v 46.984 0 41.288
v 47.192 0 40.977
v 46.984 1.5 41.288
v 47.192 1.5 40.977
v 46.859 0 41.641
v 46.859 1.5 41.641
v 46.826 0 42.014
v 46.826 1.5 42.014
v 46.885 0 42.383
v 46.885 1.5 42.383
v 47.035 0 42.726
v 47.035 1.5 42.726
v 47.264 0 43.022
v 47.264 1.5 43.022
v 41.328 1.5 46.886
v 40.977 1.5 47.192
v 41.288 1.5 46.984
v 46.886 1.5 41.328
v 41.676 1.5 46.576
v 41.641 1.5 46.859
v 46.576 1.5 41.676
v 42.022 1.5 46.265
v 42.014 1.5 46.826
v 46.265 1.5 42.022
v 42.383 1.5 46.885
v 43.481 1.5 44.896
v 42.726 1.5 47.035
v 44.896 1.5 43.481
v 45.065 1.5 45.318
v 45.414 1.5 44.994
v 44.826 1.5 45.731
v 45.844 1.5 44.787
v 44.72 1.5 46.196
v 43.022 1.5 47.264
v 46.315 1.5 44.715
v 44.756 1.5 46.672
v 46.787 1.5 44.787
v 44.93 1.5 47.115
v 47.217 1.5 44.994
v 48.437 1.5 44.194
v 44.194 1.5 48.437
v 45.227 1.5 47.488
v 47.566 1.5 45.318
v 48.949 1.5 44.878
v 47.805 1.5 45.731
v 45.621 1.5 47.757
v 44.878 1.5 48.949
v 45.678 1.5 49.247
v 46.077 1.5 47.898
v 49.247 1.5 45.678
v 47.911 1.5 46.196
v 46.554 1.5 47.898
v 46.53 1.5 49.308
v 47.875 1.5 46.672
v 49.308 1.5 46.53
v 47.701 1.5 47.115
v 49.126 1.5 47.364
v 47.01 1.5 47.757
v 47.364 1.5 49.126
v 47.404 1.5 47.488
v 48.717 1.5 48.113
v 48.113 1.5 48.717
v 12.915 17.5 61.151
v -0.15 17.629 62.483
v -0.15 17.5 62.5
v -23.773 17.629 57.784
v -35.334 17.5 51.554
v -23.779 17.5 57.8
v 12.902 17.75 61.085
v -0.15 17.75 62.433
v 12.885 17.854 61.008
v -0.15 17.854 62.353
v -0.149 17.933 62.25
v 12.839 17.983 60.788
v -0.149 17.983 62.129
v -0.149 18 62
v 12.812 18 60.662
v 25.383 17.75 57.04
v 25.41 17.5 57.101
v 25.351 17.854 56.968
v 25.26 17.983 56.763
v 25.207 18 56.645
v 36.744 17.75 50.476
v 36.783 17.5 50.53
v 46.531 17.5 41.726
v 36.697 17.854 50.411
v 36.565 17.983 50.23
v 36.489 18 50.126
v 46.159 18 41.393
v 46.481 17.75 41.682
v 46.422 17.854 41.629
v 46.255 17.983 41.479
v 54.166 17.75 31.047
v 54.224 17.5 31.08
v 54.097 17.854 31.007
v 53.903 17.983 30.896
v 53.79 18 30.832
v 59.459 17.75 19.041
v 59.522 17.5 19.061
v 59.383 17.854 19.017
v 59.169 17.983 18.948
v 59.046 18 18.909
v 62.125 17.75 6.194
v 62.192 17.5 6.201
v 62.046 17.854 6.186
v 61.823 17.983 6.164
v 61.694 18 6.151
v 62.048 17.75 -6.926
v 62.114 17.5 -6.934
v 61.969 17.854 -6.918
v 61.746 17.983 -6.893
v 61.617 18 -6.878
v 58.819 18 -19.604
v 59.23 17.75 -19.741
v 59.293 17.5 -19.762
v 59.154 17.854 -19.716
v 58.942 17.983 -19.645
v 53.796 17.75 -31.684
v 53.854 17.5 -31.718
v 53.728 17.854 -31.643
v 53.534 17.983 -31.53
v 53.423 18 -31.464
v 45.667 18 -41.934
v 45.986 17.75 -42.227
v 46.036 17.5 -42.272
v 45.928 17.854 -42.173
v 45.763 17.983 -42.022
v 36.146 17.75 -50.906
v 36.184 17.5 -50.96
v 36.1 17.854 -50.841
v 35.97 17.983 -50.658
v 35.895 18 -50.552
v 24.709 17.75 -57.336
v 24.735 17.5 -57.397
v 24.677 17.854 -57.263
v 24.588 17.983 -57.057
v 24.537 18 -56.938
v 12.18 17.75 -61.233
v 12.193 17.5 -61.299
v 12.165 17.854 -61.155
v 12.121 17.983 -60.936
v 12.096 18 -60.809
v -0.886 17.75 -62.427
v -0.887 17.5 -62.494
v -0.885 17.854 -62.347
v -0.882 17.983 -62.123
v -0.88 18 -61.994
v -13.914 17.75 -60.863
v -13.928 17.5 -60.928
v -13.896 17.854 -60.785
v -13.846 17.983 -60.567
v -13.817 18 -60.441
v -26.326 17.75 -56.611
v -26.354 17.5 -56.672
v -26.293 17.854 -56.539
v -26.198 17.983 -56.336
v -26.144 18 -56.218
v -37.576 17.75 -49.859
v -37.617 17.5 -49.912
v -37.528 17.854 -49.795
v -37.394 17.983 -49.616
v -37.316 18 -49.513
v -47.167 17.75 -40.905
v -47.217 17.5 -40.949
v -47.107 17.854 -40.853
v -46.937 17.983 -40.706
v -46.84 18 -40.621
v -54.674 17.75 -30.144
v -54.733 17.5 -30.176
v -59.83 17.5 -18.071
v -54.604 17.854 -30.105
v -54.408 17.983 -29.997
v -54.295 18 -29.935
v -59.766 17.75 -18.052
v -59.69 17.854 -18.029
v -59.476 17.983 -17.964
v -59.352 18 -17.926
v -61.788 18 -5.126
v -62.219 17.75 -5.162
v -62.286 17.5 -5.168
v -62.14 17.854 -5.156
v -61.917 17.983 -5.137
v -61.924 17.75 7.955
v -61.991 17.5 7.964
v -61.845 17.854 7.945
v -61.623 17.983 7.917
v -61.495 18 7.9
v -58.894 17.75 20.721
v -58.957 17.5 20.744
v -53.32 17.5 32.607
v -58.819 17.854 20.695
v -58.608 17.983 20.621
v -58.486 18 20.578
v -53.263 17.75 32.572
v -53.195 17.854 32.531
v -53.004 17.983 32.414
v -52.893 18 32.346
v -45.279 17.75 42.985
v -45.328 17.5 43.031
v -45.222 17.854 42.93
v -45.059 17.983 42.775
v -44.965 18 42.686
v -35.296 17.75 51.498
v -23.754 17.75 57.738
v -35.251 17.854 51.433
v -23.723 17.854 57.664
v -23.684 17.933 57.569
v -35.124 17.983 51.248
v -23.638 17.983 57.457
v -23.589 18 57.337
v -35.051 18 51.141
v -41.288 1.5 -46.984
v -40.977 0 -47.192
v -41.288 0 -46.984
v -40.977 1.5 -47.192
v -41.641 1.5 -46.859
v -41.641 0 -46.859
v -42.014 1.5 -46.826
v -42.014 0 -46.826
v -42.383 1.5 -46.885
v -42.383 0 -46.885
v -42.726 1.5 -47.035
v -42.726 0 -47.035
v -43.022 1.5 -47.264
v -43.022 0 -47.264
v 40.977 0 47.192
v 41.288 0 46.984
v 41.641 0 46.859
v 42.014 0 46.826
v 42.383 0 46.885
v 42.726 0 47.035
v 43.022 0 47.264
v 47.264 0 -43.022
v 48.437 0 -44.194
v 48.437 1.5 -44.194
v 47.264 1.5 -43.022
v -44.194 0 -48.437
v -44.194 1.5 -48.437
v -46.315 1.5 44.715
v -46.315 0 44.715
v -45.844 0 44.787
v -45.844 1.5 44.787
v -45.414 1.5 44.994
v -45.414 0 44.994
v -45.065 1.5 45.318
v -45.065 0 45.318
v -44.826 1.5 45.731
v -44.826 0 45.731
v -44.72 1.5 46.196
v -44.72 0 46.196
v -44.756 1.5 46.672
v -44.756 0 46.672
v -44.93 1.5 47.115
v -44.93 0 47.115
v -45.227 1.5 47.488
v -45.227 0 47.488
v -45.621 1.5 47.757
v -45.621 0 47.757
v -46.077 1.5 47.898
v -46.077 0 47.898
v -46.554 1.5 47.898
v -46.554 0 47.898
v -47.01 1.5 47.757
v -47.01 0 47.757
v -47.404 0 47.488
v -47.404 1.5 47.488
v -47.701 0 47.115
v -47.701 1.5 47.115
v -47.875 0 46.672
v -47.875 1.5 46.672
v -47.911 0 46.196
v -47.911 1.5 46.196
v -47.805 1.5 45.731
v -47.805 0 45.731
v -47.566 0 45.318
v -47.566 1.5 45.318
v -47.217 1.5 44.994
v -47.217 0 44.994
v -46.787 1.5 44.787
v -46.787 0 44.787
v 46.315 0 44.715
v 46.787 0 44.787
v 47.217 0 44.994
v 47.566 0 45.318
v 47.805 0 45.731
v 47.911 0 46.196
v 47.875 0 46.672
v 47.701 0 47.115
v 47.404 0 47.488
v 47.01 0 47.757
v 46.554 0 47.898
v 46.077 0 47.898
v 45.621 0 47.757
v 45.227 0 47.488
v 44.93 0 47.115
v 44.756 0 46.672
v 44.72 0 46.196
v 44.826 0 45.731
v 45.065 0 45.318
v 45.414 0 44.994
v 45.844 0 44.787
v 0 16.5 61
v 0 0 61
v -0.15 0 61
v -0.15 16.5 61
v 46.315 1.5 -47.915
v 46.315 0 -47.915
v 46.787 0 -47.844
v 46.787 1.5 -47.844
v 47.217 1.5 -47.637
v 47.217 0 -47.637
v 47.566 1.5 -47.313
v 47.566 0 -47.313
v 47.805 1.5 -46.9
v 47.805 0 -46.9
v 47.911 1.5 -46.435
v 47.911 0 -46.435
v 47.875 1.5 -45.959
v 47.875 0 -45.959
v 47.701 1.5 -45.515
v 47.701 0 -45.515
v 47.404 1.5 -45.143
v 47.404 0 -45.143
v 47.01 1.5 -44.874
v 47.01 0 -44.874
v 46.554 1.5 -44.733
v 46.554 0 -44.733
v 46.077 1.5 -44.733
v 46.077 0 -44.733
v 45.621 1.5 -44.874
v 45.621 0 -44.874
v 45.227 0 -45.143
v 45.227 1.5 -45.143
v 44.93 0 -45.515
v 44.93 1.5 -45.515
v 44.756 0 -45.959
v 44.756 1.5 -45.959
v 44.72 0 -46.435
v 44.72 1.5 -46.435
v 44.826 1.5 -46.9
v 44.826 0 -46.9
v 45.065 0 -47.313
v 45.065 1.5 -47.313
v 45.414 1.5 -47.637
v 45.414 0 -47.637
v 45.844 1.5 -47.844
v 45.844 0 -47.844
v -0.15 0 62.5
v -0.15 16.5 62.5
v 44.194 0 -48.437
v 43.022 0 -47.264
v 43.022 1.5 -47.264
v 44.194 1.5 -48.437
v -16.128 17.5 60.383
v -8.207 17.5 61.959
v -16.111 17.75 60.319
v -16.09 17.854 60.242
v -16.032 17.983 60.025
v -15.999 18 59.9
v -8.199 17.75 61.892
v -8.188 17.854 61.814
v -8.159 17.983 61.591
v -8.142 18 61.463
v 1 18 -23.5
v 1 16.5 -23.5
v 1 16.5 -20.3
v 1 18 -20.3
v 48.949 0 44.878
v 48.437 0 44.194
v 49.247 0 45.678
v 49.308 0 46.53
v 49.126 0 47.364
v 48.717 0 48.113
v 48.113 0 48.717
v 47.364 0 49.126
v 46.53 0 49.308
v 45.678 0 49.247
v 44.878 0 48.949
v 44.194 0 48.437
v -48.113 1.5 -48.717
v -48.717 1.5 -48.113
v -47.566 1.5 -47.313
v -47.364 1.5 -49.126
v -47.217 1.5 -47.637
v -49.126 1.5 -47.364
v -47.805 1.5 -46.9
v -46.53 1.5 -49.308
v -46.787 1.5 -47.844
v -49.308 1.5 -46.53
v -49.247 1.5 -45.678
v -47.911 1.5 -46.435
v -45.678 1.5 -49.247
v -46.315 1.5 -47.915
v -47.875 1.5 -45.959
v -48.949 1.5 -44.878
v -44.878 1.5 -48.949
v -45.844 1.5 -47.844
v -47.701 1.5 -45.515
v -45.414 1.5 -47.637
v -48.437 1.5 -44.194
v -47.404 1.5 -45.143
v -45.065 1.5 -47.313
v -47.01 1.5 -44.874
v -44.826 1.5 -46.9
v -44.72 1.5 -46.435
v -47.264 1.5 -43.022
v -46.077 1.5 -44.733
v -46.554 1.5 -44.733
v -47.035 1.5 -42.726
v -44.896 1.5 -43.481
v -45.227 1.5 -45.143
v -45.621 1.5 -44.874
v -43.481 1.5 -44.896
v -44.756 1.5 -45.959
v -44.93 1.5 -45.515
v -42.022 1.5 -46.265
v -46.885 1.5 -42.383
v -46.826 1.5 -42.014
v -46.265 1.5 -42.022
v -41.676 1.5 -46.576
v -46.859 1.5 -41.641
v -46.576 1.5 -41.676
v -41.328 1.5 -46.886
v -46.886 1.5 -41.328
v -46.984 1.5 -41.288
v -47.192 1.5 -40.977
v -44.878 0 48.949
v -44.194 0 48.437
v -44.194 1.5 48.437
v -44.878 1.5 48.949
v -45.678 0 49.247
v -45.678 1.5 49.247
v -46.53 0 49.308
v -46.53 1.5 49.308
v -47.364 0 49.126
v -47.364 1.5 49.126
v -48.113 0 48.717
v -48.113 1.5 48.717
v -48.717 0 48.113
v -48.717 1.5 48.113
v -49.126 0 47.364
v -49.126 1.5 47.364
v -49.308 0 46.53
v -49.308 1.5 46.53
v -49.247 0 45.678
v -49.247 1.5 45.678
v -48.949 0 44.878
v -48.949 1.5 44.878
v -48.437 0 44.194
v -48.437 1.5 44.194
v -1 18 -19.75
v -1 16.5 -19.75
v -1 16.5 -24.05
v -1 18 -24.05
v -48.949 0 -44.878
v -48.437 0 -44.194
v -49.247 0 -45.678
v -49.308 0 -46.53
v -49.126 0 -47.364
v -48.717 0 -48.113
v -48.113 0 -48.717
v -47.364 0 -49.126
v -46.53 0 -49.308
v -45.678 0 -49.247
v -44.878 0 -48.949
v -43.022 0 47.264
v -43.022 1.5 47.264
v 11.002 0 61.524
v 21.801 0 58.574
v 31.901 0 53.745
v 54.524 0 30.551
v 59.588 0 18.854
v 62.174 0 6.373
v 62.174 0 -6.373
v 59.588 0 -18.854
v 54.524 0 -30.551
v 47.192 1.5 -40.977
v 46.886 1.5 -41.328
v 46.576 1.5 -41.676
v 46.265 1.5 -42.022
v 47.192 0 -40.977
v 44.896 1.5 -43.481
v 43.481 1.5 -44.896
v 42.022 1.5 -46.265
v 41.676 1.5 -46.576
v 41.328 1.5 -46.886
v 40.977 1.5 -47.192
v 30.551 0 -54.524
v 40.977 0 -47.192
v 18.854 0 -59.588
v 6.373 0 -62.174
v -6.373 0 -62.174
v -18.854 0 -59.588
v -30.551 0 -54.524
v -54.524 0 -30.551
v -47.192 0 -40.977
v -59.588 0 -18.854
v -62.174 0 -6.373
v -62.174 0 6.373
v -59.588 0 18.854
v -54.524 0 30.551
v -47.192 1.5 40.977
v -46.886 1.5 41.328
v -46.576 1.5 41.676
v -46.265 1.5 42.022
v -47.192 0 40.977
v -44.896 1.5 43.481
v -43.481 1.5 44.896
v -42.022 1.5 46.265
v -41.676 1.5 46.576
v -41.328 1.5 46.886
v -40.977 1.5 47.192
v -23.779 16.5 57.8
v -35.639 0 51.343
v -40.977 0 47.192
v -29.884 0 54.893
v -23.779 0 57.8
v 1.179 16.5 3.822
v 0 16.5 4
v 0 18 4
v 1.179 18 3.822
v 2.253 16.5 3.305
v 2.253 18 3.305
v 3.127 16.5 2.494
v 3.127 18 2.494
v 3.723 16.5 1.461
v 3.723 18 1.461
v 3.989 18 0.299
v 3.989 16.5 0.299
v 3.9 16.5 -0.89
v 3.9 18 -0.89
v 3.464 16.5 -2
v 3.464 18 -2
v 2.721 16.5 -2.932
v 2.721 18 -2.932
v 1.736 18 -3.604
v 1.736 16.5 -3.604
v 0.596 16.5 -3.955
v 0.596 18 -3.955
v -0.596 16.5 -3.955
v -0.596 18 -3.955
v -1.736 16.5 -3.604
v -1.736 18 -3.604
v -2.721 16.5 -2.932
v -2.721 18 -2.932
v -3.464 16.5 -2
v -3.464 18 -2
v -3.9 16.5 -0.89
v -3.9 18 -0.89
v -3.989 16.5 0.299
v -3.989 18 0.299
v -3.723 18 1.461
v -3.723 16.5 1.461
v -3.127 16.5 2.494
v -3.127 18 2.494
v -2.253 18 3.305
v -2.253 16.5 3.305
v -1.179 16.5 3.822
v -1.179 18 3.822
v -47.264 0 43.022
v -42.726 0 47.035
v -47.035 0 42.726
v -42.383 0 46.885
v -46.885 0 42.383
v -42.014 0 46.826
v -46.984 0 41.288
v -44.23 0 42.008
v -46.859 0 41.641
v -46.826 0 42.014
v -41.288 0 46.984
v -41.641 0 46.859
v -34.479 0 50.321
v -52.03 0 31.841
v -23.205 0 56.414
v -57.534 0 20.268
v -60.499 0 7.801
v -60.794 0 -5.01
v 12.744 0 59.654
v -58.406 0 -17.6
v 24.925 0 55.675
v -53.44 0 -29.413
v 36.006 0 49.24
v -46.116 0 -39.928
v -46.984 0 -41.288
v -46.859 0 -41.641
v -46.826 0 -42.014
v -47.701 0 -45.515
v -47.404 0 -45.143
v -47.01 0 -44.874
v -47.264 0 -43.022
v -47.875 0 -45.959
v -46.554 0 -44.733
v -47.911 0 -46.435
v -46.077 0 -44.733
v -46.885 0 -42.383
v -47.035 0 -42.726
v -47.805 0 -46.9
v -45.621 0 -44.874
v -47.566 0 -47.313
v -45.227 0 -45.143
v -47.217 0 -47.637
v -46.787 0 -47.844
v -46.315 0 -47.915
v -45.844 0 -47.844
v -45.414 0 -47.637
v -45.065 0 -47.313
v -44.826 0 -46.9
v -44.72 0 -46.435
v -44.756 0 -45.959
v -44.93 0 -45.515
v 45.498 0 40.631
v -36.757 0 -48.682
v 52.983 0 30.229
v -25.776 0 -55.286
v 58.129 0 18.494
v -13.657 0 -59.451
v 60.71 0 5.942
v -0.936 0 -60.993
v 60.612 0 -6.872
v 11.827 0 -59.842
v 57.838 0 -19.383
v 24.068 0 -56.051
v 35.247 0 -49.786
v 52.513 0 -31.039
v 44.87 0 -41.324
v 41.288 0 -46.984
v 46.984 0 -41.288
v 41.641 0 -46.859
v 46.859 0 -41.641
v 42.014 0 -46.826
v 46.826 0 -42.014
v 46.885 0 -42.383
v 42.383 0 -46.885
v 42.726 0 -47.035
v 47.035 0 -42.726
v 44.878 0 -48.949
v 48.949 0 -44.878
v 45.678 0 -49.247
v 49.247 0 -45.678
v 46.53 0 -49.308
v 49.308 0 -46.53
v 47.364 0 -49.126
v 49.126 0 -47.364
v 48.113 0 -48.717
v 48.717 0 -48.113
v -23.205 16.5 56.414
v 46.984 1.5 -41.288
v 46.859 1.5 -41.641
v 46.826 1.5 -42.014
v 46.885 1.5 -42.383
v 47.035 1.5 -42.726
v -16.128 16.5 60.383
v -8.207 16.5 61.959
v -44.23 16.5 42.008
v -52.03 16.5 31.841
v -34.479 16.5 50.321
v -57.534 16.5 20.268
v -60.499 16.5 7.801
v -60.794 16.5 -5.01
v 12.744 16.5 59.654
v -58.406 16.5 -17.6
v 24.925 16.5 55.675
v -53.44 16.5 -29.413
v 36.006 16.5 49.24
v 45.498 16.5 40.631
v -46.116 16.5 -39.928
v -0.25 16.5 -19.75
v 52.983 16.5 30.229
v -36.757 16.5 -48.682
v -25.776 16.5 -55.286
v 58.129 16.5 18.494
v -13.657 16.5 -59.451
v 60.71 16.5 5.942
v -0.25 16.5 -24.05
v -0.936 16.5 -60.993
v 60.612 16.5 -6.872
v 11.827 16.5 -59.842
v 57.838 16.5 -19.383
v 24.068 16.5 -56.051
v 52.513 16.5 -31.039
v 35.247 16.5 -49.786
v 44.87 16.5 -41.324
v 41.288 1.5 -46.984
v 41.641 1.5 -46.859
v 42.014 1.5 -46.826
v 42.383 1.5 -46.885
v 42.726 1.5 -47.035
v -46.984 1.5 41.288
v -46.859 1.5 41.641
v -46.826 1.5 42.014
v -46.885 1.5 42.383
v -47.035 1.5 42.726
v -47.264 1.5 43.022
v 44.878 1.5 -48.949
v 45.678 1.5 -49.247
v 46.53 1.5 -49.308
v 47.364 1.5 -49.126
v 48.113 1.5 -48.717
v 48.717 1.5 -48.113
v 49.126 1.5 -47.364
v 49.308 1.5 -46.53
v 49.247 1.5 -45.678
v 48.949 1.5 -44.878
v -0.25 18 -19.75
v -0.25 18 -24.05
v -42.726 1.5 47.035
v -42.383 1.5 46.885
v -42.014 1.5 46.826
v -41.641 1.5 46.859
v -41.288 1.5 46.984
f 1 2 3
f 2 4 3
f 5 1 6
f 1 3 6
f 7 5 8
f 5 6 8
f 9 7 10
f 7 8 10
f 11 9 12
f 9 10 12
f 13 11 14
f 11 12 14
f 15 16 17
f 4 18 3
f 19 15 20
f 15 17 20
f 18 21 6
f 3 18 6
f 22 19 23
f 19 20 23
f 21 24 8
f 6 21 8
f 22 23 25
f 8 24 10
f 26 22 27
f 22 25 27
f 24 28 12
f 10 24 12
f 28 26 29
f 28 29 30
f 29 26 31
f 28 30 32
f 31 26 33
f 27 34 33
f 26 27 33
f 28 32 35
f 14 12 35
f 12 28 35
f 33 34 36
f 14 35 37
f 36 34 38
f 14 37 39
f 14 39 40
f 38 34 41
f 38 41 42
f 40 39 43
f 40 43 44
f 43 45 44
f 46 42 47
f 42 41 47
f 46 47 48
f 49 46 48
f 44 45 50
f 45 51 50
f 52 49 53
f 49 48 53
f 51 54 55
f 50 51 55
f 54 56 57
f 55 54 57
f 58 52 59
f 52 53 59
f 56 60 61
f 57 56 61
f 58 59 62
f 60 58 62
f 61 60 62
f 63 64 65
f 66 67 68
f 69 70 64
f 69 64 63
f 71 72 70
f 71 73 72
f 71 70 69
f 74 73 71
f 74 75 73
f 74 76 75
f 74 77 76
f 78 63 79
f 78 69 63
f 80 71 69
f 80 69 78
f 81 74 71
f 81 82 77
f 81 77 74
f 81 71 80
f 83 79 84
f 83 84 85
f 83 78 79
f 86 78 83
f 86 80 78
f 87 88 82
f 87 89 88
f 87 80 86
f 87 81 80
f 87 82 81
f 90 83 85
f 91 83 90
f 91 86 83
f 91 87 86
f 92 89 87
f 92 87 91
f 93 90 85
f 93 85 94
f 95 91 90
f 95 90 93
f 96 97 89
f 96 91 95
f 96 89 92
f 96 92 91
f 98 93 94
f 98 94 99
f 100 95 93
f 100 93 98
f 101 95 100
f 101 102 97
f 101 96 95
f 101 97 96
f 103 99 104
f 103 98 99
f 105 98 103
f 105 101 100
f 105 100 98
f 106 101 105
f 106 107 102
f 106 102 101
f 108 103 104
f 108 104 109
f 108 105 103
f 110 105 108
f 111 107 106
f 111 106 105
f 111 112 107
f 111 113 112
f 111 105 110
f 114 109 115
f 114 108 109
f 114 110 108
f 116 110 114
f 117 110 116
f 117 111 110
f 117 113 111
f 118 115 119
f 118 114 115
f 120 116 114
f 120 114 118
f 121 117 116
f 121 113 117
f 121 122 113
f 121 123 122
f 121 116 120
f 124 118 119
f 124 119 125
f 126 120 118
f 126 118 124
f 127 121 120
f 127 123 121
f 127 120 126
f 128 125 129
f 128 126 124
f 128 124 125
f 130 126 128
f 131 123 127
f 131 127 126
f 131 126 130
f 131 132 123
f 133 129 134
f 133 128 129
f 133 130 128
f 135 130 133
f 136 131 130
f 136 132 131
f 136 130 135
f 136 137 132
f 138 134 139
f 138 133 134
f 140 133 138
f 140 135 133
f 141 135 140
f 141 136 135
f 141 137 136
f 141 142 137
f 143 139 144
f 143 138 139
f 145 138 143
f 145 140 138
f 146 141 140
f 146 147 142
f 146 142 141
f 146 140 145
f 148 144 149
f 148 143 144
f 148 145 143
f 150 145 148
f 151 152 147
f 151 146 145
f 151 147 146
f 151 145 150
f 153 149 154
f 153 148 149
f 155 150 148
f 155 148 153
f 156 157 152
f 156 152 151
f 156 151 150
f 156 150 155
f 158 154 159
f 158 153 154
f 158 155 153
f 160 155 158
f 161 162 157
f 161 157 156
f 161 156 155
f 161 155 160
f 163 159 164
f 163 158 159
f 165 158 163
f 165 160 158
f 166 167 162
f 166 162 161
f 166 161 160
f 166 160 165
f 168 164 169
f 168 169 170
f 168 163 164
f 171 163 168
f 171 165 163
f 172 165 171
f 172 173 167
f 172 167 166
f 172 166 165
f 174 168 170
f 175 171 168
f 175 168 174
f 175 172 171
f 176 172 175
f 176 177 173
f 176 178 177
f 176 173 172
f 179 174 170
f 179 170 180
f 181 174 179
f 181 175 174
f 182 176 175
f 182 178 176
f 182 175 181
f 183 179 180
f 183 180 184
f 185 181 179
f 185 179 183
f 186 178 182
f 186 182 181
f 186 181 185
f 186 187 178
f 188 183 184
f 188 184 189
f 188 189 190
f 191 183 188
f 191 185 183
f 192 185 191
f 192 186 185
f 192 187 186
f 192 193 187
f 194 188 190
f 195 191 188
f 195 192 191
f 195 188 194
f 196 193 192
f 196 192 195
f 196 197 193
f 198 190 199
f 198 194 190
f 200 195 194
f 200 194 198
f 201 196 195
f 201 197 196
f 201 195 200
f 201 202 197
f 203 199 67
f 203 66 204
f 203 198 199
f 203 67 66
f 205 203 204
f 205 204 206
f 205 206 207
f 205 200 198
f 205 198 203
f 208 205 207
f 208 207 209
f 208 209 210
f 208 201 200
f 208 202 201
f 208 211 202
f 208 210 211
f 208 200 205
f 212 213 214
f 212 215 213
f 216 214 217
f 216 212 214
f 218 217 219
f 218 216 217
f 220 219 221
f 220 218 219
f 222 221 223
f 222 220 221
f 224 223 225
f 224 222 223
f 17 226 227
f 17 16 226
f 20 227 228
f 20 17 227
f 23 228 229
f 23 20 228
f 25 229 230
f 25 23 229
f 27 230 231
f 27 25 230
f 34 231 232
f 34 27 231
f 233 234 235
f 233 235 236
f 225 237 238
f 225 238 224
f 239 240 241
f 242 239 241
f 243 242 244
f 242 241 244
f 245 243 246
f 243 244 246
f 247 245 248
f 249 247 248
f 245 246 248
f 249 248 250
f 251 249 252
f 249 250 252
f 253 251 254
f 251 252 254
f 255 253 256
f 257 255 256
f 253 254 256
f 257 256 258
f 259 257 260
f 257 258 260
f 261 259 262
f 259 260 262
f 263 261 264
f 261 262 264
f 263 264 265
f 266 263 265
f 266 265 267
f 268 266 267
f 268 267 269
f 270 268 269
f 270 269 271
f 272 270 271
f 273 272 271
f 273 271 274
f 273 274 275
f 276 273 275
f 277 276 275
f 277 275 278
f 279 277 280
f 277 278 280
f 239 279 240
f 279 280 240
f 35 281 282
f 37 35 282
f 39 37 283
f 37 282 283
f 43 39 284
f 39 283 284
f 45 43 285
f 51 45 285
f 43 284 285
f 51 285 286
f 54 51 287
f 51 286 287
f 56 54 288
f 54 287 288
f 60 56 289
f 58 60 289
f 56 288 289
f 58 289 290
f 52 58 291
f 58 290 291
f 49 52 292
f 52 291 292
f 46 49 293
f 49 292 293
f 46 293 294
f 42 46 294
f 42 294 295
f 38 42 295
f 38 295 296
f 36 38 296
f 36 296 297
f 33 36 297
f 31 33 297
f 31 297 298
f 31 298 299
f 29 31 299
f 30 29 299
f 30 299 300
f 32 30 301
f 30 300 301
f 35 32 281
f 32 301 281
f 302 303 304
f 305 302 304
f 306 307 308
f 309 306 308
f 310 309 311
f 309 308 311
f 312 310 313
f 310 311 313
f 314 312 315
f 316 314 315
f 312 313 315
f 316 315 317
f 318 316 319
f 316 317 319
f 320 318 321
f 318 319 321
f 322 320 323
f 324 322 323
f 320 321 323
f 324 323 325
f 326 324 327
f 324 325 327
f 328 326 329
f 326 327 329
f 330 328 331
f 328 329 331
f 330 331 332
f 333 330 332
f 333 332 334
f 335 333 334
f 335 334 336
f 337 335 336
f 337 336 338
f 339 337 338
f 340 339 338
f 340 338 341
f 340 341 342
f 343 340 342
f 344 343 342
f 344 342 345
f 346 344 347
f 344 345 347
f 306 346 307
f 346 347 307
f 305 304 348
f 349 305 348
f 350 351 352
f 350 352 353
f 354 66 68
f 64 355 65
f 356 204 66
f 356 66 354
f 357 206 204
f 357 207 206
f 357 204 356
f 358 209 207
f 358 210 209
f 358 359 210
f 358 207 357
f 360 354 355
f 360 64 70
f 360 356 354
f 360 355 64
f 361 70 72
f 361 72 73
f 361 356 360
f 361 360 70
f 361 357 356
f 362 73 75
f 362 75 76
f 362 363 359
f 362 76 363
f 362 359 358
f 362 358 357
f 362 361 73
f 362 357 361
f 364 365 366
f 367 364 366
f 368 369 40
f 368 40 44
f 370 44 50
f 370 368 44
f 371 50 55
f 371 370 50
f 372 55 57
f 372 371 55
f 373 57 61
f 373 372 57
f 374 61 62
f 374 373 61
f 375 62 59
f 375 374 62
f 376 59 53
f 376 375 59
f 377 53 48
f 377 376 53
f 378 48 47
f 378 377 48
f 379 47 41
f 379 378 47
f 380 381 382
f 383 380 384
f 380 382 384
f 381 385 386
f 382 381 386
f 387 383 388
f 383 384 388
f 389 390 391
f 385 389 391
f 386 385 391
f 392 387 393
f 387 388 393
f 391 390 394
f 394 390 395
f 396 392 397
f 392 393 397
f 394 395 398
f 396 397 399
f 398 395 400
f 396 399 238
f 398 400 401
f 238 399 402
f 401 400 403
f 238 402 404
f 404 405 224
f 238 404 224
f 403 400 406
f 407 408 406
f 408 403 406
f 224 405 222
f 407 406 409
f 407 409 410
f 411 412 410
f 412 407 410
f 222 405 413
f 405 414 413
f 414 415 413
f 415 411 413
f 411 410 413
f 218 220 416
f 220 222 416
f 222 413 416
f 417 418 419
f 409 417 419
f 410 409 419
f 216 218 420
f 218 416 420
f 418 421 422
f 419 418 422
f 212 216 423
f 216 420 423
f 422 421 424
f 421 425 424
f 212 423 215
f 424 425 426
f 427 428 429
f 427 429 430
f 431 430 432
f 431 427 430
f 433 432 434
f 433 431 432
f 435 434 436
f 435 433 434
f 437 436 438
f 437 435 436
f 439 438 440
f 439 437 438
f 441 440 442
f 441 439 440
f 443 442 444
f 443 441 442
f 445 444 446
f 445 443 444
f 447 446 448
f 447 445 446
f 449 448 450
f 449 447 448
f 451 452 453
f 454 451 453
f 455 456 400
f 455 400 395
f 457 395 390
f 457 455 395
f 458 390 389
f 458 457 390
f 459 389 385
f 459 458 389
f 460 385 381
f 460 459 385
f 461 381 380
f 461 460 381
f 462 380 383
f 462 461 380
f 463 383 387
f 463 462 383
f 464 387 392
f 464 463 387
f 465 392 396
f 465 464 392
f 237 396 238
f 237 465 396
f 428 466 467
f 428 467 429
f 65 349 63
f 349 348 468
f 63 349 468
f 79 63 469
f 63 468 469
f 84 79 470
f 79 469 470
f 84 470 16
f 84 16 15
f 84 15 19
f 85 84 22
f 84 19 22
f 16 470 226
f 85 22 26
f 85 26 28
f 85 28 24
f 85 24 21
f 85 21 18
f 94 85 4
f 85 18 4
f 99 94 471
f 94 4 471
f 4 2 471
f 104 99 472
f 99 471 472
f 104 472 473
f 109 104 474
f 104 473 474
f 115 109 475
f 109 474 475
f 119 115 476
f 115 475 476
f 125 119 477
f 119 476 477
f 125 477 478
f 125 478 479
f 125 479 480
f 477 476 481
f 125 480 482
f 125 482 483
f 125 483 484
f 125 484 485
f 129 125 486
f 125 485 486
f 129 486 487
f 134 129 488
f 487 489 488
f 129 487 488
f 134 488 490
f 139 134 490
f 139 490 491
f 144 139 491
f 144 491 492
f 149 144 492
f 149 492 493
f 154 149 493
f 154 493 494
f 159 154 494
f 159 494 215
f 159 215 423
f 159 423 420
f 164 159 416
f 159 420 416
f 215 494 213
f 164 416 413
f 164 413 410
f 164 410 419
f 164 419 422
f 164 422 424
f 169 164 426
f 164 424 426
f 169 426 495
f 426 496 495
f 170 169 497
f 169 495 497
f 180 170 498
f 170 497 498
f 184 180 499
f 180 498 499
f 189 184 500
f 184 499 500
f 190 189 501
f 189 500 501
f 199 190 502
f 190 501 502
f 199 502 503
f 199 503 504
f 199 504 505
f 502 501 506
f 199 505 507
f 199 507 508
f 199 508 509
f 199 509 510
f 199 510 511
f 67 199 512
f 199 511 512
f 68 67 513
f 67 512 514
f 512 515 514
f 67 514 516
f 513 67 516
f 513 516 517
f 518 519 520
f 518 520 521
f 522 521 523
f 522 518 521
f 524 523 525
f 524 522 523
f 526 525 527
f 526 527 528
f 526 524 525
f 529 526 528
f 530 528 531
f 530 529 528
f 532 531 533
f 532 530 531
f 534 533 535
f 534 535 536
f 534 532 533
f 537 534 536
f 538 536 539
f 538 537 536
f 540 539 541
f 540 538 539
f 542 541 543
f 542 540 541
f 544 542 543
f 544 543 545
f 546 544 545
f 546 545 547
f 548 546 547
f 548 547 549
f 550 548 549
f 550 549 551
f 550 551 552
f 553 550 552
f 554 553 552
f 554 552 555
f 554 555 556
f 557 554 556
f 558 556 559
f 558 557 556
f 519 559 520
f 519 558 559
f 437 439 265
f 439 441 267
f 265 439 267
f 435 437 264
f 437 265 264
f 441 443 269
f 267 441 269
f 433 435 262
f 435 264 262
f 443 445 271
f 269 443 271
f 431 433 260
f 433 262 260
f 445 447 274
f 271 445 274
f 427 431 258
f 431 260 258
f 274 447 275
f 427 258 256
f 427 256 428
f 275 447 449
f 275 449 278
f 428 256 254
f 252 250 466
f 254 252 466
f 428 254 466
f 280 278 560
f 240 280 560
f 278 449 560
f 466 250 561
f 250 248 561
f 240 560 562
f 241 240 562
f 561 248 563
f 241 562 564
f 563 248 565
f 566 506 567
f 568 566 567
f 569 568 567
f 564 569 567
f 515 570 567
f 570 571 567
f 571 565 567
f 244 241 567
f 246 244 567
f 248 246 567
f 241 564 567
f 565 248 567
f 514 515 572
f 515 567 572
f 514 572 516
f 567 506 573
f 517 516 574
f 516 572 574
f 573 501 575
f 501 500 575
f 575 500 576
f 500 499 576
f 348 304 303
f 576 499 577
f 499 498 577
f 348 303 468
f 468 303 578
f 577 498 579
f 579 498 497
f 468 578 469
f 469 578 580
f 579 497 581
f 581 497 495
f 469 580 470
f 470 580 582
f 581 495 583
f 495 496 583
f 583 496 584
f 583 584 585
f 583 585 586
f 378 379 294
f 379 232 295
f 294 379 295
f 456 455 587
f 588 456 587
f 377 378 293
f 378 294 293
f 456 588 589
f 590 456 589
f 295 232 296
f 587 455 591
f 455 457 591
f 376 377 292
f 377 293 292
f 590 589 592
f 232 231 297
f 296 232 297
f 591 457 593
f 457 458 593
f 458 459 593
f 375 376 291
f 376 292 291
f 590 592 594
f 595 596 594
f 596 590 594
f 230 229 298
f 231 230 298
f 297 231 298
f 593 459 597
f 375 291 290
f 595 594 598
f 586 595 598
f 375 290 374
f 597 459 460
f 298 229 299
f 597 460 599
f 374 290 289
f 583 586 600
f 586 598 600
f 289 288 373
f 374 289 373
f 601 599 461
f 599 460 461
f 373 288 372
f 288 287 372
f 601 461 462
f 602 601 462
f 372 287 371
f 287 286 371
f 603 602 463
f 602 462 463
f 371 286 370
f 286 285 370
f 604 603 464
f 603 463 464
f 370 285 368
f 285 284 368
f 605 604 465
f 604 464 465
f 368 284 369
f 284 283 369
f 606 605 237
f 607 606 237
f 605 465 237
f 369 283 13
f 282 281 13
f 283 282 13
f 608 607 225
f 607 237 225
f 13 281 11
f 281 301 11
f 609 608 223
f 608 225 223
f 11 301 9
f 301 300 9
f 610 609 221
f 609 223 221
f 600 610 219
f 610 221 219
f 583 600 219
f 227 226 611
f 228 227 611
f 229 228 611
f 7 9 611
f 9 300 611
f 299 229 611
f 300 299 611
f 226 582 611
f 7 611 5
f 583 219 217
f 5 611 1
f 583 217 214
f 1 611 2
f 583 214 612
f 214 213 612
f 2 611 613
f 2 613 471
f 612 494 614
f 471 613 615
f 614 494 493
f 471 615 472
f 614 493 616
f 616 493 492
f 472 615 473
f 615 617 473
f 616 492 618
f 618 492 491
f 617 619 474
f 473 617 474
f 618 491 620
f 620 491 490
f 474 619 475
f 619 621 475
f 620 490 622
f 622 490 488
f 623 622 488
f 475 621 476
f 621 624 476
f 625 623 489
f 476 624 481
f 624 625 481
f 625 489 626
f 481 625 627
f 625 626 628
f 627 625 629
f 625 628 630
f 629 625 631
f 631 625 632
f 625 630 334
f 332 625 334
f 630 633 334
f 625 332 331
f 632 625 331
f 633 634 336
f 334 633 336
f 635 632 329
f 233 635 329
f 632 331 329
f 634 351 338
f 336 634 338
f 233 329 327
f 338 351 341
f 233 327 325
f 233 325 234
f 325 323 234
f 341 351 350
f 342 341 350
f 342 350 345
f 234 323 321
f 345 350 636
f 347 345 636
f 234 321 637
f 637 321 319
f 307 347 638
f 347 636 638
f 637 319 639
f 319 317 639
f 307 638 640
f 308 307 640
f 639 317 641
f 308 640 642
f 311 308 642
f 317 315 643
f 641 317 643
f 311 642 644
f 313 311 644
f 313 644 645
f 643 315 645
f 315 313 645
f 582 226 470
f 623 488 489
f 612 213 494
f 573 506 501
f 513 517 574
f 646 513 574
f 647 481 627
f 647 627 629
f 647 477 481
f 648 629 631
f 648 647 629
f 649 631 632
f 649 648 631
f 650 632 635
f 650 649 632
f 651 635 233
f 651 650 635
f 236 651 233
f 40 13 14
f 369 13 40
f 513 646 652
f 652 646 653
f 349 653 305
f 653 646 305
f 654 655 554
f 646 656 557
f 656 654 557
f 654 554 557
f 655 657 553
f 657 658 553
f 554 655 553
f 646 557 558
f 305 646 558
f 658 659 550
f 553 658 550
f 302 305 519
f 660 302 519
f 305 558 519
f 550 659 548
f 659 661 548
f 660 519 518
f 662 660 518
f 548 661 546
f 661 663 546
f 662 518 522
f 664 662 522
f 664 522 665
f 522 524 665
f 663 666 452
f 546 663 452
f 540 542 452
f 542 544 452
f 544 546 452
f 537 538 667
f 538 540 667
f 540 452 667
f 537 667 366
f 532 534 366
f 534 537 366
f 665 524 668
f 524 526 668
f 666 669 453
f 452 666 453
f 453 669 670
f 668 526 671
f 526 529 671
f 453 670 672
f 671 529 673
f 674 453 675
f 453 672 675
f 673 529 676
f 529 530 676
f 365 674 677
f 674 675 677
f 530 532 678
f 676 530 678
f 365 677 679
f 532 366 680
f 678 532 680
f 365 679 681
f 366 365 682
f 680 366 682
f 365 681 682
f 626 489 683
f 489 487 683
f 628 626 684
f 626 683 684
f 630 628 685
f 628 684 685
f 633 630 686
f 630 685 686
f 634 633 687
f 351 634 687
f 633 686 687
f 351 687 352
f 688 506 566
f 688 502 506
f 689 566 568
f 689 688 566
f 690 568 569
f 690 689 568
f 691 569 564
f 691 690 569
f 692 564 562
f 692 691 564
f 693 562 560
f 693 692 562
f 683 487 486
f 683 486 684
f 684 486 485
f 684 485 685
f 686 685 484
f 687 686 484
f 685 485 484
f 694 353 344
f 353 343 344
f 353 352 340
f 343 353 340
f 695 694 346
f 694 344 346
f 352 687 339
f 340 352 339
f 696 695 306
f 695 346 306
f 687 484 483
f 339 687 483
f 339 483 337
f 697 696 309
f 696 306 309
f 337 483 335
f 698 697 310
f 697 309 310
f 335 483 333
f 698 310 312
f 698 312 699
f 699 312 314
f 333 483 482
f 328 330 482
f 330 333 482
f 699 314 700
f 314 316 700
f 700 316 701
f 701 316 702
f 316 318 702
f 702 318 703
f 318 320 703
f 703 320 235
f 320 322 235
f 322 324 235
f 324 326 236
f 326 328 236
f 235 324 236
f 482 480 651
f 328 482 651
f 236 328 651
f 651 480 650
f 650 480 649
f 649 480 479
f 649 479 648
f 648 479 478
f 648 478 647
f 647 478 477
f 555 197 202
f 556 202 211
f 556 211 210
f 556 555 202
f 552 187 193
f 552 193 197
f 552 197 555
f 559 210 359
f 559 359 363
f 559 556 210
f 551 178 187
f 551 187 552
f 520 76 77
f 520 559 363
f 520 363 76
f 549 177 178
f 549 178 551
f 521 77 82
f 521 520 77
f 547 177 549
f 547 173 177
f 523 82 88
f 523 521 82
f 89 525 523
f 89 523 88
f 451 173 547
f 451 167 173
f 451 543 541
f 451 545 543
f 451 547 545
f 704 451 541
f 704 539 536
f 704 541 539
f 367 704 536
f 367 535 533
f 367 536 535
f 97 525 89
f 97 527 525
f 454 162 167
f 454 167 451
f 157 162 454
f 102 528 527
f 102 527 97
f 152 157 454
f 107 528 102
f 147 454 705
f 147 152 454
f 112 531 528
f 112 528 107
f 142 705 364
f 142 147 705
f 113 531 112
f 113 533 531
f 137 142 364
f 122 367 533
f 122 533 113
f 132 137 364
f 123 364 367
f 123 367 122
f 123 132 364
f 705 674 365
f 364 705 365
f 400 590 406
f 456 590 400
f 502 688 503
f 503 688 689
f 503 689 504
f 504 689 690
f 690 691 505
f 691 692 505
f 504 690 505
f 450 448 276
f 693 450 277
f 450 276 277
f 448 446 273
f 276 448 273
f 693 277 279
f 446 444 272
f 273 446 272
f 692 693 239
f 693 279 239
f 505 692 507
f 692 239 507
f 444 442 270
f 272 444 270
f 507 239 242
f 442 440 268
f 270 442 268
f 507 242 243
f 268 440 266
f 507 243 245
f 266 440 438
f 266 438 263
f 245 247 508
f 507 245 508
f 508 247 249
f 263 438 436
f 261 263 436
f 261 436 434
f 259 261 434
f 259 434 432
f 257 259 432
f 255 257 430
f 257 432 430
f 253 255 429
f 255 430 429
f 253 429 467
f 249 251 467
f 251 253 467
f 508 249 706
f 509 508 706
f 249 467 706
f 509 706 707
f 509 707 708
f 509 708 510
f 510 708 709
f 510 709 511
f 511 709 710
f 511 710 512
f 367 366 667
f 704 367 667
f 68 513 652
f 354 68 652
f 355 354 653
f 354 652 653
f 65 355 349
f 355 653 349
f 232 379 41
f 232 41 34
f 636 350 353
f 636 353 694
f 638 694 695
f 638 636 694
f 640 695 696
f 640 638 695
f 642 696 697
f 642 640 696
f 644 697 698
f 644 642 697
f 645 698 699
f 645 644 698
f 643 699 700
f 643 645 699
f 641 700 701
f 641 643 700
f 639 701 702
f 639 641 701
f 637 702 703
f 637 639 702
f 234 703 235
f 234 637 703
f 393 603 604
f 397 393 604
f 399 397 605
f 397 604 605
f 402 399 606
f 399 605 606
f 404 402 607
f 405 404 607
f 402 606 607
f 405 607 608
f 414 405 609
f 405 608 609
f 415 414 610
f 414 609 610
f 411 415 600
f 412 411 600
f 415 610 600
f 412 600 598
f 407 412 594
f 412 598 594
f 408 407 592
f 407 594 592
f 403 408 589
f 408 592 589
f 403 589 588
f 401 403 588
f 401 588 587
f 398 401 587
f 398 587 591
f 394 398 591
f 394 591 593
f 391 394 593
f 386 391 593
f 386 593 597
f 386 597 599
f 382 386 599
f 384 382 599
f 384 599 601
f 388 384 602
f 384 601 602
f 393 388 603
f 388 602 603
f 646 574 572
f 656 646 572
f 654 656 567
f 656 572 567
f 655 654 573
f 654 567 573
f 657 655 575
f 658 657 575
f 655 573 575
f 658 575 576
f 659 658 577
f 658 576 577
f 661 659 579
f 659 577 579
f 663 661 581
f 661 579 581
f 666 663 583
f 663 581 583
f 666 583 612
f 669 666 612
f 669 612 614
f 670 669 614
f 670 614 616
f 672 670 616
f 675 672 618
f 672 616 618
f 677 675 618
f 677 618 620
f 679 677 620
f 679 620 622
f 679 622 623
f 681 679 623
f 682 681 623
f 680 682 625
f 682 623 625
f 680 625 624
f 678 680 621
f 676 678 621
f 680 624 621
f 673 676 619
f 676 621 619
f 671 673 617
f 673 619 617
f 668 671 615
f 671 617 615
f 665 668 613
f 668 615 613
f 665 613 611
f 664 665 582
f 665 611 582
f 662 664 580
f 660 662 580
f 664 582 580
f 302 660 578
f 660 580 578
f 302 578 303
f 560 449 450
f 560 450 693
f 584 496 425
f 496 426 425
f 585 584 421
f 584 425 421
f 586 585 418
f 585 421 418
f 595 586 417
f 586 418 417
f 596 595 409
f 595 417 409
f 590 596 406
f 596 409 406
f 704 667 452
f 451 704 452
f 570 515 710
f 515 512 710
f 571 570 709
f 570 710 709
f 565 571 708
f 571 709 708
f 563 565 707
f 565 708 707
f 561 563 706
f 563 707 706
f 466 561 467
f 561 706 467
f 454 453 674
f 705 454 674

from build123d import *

# Parameters (mm, degrees)
EXTRUDE_1_DEPTH = 16.5
SKETCH_2_R      = 4
EXTRUDE_2_DEPTH = 1.5
FILLET_1_R      = 0.5
SKETCH_3_R      = 1.6
EXTRUDE_4_DEPTH = 1.5
FILLET_2_R      = 1.5


with BuildPart() as part:
    # Эскиз1 → Бобышка-Вытянуть1 (new body)
    with BuildSketch(Plane(origin=(0, 0, 0), x_dir=(1, 0, 0), z_dir=(0, 1, 0))):
        with BuildLine():
            Line((-23.77906371, -57.799706998), (-23.205036867, -56.41388361))
            ThreePointArc((-23.205036867, -56.41388361), (11.826941696, 59.842488669), (0, -61))
            Line((0, -61), (-0.15, -61))
            Line((-0.15, -61), (-0.15, -62.49982))
            ThreePointArc((-0.15, -62.49982), (12.193145126, 61.299080025), (-23.77906371, -57.799706998))
        make_face()
    extrude(amount=EXTRUDE_1_DEPTH)

    # Эскиз2 → Бобышка-Вытянуть2 (add)
    # profile 1 of 2: a face of its own
    with BuildSketch(Plane(origin=(0, 16.5, 0), x_dir=(1, 0, 0), z_dir=(0, 1, 0))):
        with BuildLine():
            Line((0, -61), (-0.15, -61))
            Line((-0.15, -61), (-0.15, -62.49982))
            ThreePointArc((-0.15, -62.49982), (12.193145126, 61.299080025), (-23.77906371, -57.799706998))
            Line((-23.77906371, -57.799706998), (-23.205036867, -56.41388361))
            ThreePointArc((-23.205036867, -56.41388361), (11.826941696, 59.842488669), (0, -61))
        make_face()
    # profile 2 of 2: a face of its own
    with BuildSketch(Plane(origin=(0, 16.5, 0), x_dir=(1, 0, 0), z_dir=(0, 1, 0))):
        with BuildLine():
            Line((-23.205036867, -56.41388361), (-23.77906371, -57.799706998))
            ThreePointArc((-23.77906371, -57.799706998), (-12.193145126, -61.299080025), (-0.15, -62.49982))
            Line((-0.15, -62.49982), (-0.15, -61))
            Line((-0.15, -61), (0, -61))
            ThreePointArc((0, -61), (11.826941696, 59.842488669), (-23.205036867, -56.41388361))
        make_face()
        with Locations(Location((0, 0, 0), (0, 0, 270))):
            Circle(SKETCH_2_R, mode=Mode.SUBTRACT)
        Polygon((-1, 23.5), (-1, 24.05), (-0.25, 24.05), (1, 23.5), (1, 20.3), (-0.25, 19.75), (-1, 19.75), (-1, 20.3), align=None, mode=Mode.SUBTRACT)
    extrude(amount=EXTRUDE_2_DEPTH)

    # Скругление1
    fillet_1_edges = [part.edges().sort_by_distance(p)[0] for p in [
        (23.77906371, 18, -57.799706998),
    ]]
    fillet(fillet_1_edges, radius=FILLET_1_R)

    # Эскиз3 → Бобышка-Вытянуть4 (add)
    # profile 1 of 4: a face of its own
    with BuildSketch(Plane.XZ):
        with BuildLine():
            Line((-42.021912433, 46.264553121), (-44.194173824, 48.436814511))
            ThreePointArc((-44.194173824, 48.436814511), (-48.436814511, 48.436814511), (-48.436814511, 44.194173824))
            Line((-48.436814511, 44.194173824), (-46.264553121, 42.021912433))
            ThreePointArc((-46.264553121, 42.021912433), (-44.194173824, 44.194173824), (-42.021912433, 46.264553121))
        make_face()
        with Locations(Location((-46.315494168, 46.315494168, 0), (0, 0, 270))):
            Circle(SKETCH_3_R, mode=Mode.SUBTRACT)
    # profile 2 of 4: a face of its own
    with BuildSketch(Plane.XZ):
        with BuildLine():
            Line((44.194173824, 48.436814511), (42.021912433, 46.264553121))
            ThreePointArc((42.021912433, 46.264553121), (44.194173824, 44.194173824), (46.264553121, 42.021912433))
            Line((46.264553121, 42.021912433), (48.436814511, 44.194173824))
            ThreePointArc((48.436814511, 44.194173824), (48.436814511, 48.436814511), (44.194173824, 48.436814511))
        make_face()
        with Locations(Location((46.315494168, 46.315494168, 0), (0, 0, 270))):
            Circle(SKETCH_3_R, mode=Mode.SUBTRACT)
    # profile 3 of 4: a face of its own
    with BuildSketch(Plane.XZ):
        with BuildLine():
            ThreePointArc((-42.021912433, -46.264553121), (-44.194173824, -44.194173824), (-46.264553121, -42.021912433))
            Line((-46.264553121, -42.021912433), (-48.436814511, -44.194173824))
            ThreePointArc((-48.436814511, -44.194173824), (-48.436814511, -48.436814511), (-44.194173824, -48.436814511))
            Line((-44.194173824, -48.436814511), (-42.021912433, -46.264553121))
        make_face()
        with Locations(Location((-46.315494168, -46.315494168, 0), (0, 0, 270))):
            Circle(SKETCH_3_R, mode=Mode.SUBTRACT)
    # profile 4 of 4: a face of its own
    with BuildSketch(Plane.XZ):
        with BuildLine():
            ThreePointArc((46.264553121, -42.021912433), (44.194173824, -44.194173824), (42.021912433, -46.264553121))
            Line((42.021912433, -46.264553121), (44.194173824, -48.436814511))
            ThreePointArc((44.194173824, -48.436814511), (48.436814511, -48.436814511), (48.436814511, -44.194173824))
            Line((48.436814511, -44.194173824), (46.264553121, -42.021912433))
        make_face()
        with Locations(Location((46.315494168, -46.315494168, 0), (0, 0, 270))):
            Circle(SKETCH_3_R, mode=Mode.SUBTRACT)
    extrude(amount=-EXTRUDE_4_DEPTH)

    # Скругление2
    fillet_2_edges = [part.edges().sort_by_distance(p)[0] for p in [
        (-42.021912433, 0.75, 46.264553121),
        (-46.264553121, 0.75, 42.021912433),
        (46.264553121, 0.75, 42.021912433),
        (42.021912433, 0.75, 46.264553121),
        (-46.264553121, 0.75, -42.021912433),
        (-42.021912433, 0.75, -46.264553121),
        (42.021912433, 0.75, -46.264553121),
        (46.264553121, 0.75, -42.021912433),
    ]]
    fillet(fillet_2_edges, radius=FILLET_2_R)


solid = part.part
